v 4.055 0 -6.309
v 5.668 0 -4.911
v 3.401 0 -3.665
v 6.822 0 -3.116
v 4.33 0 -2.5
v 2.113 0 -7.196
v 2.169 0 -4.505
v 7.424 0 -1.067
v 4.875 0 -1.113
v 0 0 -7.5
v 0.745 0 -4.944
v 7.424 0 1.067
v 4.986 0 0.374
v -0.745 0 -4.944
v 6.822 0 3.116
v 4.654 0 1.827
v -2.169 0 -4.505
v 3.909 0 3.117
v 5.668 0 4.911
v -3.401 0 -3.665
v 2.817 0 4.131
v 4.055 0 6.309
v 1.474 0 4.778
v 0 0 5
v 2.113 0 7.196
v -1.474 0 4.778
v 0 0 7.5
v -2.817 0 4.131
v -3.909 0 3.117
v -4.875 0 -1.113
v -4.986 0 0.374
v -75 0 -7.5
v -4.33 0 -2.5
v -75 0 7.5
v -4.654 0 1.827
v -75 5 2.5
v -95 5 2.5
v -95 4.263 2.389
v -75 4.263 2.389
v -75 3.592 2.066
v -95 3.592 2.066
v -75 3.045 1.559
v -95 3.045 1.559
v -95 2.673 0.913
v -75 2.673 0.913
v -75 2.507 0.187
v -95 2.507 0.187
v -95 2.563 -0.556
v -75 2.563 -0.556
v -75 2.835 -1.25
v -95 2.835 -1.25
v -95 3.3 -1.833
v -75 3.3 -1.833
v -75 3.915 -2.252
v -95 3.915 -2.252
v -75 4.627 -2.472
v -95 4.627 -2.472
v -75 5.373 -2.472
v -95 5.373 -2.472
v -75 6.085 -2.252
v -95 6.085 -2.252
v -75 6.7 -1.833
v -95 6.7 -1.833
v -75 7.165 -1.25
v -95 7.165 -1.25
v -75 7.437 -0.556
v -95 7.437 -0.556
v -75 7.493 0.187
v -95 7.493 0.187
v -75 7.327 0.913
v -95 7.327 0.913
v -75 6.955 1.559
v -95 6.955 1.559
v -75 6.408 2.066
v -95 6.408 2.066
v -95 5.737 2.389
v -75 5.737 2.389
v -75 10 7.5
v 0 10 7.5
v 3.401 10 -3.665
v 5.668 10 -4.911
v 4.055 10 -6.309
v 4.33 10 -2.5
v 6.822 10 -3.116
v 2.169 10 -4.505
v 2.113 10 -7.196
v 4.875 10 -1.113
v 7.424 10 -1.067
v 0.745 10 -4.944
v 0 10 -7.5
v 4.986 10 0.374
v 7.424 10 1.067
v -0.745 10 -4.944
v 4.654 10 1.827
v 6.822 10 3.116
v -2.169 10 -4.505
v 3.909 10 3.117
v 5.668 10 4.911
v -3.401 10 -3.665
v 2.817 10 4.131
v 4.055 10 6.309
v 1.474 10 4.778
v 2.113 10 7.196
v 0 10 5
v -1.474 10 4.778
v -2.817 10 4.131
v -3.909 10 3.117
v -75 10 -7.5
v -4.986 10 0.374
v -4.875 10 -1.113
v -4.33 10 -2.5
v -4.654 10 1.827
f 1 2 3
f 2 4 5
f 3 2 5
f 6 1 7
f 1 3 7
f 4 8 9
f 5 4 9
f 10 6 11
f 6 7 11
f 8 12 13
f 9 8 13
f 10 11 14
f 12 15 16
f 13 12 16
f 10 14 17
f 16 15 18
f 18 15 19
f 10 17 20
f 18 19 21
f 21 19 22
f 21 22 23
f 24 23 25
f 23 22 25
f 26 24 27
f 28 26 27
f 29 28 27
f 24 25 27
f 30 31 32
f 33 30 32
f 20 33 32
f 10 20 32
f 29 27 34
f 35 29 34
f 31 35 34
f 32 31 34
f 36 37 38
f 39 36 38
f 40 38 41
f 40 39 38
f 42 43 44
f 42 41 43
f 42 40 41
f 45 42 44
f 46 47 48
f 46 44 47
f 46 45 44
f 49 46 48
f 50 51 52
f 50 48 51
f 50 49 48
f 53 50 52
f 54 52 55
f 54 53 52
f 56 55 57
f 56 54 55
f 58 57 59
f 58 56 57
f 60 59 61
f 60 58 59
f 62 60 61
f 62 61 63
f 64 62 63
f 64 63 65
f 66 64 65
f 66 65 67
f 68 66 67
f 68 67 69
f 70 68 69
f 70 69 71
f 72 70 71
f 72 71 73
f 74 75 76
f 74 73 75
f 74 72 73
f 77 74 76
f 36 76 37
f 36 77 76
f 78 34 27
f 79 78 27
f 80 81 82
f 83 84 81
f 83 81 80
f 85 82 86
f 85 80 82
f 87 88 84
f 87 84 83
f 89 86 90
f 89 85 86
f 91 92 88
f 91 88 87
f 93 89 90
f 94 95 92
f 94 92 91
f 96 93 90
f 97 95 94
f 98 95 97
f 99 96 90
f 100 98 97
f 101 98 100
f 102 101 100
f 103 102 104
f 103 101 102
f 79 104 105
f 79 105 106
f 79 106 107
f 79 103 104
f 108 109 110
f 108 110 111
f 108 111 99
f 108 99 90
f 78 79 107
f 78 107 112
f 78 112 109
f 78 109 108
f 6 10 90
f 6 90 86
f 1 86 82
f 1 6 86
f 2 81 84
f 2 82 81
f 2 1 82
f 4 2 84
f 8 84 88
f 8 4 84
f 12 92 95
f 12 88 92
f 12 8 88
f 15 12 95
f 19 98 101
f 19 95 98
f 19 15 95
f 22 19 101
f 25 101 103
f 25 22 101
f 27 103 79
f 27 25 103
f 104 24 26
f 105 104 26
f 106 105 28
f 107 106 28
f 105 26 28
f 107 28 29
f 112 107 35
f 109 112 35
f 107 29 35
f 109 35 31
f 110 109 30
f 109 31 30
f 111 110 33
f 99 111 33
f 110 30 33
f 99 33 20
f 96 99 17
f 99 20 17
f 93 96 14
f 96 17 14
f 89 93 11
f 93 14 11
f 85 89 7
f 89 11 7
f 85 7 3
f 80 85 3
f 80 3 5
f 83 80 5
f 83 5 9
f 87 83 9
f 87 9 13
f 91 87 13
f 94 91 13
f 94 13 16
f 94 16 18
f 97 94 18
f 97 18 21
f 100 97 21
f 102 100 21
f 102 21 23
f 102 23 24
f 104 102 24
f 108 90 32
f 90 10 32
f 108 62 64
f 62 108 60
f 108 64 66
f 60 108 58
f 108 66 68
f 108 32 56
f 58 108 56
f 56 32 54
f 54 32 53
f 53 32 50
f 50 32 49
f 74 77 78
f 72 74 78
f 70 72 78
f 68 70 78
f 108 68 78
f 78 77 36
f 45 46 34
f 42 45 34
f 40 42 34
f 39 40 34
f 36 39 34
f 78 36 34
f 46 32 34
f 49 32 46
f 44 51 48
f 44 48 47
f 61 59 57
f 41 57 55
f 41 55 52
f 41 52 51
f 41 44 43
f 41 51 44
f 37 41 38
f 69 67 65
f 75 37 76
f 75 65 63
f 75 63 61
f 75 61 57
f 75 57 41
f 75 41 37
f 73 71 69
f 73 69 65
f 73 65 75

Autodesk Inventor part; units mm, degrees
ref_plane "YZ Plane" through (0, 0, 0) normal (1, 0, 0) x (0, 1, 0)
ref_plane "XZ Plane" through (0, 0, 0) normal (0, 1, 0) x (-1, 0, 0)
ref_plane "XY Plane" through (0, 0, 0) normal (0, 0, 1) x (1, 0, 0)
sketch "Sketch1" plane through (0, 0, 0) normal (0, 1, 0) x (-1, 0, 0)
  point P0 (0, 0)
sketch "Sketch2" plane through (0, 0, 0) normal (0, 1, 0) x (-1, 0, 0)
  line L0 (0, 0) -> (0, -7.5)
  line L1 (0, -7.5) -> (75, -7.5)
  line L2 (75, -7.5) -> (75, 7.5)
  line L3 (75, 7.5) -> (0, 7.5)
  line L4 (0, 7.5) -> (0, 0)
  arc A0 (0, 7.5) -> (0, -7.5) centre (0, 0) ccw
  dimension "d0" = 7.5
  dimension "d1" = 75
  dimension "d2" = 15
extrude "Extrusion1" add sketch "Sketch2" along normal blind 10
sketch "Sketch3" plane through (0, 10, 0) normal (0, 1, 0) x (1, 0, 0)
  point P0 (0, 0)
  point P1 (0, 0)
hole "Hole1" at (0, 10, 0) direction (0, -1, 0) diameter 10 end through all
sketch "Sketch4" plane through (-75, 0, -7.5) normal (-1, 0, 0) x (0, 0, 1)
  circle A0 centre (7.5, 5) radius 2.5
  point P0 (7.5, 0)
  dimension "d14" = 5
extrude "Extrusion2" add sketch "Sketch4" along normal blind 20
properties part number "Arm"
